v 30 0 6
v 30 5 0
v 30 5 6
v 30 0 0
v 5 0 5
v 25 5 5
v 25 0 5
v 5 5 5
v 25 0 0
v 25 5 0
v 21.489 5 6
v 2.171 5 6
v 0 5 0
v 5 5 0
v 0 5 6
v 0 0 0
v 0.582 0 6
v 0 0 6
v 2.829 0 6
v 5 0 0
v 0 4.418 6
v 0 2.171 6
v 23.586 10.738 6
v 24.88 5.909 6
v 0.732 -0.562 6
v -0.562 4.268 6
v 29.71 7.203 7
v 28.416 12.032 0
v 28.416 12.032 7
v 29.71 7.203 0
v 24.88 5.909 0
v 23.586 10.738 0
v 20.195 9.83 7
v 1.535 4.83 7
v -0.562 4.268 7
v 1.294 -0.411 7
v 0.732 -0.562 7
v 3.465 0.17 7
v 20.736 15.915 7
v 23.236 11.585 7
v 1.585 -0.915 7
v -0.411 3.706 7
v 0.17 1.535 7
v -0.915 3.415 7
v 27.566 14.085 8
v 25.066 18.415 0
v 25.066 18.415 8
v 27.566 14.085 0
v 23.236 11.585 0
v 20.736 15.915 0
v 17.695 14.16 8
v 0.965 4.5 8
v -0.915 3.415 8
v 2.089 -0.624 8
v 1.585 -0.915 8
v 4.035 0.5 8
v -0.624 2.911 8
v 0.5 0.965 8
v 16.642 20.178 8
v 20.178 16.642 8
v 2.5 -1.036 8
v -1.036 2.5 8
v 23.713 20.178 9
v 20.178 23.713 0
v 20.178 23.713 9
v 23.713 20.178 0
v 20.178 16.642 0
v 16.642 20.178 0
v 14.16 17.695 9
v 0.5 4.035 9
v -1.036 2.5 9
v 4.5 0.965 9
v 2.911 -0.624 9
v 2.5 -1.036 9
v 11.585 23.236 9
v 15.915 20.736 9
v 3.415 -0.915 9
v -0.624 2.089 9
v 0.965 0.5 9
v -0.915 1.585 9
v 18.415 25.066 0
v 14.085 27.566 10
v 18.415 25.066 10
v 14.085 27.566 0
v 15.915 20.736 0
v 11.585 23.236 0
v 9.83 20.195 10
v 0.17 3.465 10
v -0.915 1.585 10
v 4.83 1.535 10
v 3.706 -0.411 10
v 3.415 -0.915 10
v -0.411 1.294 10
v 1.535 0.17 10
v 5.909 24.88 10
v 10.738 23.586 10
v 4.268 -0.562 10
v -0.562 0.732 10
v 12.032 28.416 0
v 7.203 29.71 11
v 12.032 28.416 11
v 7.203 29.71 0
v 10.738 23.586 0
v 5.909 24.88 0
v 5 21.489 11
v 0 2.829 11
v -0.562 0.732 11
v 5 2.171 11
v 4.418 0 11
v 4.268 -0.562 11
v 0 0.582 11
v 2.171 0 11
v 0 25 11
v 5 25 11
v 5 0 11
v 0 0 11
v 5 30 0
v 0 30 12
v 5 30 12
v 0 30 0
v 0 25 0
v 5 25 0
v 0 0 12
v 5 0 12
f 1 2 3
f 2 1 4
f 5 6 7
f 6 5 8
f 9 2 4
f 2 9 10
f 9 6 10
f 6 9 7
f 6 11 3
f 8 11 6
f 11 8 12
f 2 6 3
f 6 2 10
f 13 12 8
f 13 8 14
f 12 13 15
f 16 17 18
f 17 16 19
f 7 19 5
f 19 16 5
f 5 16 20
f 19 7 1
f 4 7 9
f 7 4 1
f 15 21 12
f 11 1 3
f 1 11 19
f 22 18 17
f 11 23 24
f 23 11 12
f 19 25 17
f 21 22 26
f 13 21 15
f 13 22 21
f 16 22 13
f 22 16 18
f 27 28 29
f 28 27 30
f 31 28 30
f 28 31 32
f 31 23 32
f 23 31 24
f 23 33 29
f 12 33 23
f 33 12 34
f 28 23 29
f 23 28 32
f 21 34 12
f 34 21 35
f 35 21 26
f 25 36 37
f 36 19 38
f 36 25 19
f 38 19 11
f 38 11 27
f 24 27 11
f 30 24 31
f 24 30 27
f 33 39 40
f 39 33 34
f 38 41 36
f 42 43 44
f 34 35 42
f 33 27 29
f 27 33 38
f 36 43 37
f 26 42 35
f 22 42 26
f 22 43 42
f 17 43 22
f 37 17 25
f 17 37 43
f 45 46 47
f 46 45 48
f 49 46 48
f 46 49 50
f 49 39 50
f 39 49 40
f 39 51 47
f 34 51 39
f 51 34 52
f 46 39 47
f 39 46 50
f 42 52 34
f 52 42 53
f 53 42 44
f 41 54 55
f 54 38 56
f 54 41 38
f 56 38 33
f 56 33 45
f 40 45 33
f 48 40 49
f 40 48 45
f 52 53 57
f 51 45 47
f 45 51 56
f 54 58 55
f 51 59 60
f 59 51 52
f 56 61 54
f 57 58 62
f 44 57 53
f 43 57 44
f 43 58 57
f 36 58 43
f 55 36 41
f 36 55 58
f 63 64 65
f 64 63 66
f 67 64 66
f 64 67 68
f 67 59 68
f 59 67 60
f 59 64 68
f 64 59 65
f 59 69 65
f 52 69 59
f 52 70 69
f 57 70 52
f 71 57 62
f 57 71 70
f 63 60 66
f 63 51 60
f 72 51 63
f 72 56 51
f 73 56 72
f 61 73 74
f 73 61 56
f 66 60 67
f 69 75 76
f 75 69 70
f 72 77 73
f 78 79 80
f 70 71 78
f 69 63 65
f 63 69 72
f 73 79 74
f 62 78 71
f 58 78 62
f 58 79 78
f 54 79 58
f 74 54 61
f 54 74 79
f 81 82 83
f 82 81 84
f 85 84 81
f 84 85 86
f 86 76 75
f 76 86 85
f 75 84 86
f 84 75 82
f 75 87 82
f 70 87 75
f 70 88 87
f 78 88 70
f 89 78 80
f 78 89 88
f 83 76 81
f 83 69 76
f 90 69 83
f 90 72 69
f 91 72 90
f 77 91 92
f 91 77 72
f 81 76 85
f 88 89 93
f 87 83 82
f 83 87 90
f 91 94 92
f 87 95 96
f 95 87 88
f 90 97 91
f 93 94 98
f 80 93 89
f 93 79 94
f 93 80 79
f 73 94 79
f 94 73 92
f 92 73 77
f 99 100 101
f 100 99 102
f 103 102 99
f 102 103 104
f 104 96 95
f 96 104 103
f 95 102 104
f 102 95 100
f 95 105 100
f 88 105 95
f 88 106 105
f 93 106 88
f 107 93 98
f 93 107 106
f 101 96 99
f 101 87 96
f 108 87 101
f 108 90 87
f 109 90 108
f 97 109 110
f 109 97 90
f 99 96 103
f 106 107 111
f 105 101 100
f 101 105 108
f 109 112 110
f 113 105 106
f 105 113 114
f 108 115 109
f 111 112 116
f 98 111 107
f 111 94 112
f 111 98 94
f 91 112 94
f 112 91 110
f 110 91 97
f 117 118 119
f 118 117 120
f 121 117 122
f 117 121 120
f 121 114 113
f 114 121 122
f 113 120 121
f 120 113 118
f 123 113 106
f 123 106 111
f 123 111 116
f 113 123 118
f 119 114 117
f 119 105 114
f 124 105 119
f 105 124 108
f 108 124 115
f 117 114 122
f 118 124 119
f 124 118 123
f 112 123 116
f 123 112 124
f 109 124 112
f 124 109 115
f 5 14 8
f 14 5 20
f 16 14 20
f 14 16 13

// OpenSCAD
cube(5);

translate([2.5, 2.5, 0]) {
	for(i = [0:6]) {
		rotate([0, 0, i * 15]) {
			translate([-2.5, -2.5, 0]) {
				translate([25, 0, 0])
					cube([5, 5, 5 + i]);
				translate([0, 0, 5 + i])
					cube([30, 5, 1]);
			}
		}
	}
}
